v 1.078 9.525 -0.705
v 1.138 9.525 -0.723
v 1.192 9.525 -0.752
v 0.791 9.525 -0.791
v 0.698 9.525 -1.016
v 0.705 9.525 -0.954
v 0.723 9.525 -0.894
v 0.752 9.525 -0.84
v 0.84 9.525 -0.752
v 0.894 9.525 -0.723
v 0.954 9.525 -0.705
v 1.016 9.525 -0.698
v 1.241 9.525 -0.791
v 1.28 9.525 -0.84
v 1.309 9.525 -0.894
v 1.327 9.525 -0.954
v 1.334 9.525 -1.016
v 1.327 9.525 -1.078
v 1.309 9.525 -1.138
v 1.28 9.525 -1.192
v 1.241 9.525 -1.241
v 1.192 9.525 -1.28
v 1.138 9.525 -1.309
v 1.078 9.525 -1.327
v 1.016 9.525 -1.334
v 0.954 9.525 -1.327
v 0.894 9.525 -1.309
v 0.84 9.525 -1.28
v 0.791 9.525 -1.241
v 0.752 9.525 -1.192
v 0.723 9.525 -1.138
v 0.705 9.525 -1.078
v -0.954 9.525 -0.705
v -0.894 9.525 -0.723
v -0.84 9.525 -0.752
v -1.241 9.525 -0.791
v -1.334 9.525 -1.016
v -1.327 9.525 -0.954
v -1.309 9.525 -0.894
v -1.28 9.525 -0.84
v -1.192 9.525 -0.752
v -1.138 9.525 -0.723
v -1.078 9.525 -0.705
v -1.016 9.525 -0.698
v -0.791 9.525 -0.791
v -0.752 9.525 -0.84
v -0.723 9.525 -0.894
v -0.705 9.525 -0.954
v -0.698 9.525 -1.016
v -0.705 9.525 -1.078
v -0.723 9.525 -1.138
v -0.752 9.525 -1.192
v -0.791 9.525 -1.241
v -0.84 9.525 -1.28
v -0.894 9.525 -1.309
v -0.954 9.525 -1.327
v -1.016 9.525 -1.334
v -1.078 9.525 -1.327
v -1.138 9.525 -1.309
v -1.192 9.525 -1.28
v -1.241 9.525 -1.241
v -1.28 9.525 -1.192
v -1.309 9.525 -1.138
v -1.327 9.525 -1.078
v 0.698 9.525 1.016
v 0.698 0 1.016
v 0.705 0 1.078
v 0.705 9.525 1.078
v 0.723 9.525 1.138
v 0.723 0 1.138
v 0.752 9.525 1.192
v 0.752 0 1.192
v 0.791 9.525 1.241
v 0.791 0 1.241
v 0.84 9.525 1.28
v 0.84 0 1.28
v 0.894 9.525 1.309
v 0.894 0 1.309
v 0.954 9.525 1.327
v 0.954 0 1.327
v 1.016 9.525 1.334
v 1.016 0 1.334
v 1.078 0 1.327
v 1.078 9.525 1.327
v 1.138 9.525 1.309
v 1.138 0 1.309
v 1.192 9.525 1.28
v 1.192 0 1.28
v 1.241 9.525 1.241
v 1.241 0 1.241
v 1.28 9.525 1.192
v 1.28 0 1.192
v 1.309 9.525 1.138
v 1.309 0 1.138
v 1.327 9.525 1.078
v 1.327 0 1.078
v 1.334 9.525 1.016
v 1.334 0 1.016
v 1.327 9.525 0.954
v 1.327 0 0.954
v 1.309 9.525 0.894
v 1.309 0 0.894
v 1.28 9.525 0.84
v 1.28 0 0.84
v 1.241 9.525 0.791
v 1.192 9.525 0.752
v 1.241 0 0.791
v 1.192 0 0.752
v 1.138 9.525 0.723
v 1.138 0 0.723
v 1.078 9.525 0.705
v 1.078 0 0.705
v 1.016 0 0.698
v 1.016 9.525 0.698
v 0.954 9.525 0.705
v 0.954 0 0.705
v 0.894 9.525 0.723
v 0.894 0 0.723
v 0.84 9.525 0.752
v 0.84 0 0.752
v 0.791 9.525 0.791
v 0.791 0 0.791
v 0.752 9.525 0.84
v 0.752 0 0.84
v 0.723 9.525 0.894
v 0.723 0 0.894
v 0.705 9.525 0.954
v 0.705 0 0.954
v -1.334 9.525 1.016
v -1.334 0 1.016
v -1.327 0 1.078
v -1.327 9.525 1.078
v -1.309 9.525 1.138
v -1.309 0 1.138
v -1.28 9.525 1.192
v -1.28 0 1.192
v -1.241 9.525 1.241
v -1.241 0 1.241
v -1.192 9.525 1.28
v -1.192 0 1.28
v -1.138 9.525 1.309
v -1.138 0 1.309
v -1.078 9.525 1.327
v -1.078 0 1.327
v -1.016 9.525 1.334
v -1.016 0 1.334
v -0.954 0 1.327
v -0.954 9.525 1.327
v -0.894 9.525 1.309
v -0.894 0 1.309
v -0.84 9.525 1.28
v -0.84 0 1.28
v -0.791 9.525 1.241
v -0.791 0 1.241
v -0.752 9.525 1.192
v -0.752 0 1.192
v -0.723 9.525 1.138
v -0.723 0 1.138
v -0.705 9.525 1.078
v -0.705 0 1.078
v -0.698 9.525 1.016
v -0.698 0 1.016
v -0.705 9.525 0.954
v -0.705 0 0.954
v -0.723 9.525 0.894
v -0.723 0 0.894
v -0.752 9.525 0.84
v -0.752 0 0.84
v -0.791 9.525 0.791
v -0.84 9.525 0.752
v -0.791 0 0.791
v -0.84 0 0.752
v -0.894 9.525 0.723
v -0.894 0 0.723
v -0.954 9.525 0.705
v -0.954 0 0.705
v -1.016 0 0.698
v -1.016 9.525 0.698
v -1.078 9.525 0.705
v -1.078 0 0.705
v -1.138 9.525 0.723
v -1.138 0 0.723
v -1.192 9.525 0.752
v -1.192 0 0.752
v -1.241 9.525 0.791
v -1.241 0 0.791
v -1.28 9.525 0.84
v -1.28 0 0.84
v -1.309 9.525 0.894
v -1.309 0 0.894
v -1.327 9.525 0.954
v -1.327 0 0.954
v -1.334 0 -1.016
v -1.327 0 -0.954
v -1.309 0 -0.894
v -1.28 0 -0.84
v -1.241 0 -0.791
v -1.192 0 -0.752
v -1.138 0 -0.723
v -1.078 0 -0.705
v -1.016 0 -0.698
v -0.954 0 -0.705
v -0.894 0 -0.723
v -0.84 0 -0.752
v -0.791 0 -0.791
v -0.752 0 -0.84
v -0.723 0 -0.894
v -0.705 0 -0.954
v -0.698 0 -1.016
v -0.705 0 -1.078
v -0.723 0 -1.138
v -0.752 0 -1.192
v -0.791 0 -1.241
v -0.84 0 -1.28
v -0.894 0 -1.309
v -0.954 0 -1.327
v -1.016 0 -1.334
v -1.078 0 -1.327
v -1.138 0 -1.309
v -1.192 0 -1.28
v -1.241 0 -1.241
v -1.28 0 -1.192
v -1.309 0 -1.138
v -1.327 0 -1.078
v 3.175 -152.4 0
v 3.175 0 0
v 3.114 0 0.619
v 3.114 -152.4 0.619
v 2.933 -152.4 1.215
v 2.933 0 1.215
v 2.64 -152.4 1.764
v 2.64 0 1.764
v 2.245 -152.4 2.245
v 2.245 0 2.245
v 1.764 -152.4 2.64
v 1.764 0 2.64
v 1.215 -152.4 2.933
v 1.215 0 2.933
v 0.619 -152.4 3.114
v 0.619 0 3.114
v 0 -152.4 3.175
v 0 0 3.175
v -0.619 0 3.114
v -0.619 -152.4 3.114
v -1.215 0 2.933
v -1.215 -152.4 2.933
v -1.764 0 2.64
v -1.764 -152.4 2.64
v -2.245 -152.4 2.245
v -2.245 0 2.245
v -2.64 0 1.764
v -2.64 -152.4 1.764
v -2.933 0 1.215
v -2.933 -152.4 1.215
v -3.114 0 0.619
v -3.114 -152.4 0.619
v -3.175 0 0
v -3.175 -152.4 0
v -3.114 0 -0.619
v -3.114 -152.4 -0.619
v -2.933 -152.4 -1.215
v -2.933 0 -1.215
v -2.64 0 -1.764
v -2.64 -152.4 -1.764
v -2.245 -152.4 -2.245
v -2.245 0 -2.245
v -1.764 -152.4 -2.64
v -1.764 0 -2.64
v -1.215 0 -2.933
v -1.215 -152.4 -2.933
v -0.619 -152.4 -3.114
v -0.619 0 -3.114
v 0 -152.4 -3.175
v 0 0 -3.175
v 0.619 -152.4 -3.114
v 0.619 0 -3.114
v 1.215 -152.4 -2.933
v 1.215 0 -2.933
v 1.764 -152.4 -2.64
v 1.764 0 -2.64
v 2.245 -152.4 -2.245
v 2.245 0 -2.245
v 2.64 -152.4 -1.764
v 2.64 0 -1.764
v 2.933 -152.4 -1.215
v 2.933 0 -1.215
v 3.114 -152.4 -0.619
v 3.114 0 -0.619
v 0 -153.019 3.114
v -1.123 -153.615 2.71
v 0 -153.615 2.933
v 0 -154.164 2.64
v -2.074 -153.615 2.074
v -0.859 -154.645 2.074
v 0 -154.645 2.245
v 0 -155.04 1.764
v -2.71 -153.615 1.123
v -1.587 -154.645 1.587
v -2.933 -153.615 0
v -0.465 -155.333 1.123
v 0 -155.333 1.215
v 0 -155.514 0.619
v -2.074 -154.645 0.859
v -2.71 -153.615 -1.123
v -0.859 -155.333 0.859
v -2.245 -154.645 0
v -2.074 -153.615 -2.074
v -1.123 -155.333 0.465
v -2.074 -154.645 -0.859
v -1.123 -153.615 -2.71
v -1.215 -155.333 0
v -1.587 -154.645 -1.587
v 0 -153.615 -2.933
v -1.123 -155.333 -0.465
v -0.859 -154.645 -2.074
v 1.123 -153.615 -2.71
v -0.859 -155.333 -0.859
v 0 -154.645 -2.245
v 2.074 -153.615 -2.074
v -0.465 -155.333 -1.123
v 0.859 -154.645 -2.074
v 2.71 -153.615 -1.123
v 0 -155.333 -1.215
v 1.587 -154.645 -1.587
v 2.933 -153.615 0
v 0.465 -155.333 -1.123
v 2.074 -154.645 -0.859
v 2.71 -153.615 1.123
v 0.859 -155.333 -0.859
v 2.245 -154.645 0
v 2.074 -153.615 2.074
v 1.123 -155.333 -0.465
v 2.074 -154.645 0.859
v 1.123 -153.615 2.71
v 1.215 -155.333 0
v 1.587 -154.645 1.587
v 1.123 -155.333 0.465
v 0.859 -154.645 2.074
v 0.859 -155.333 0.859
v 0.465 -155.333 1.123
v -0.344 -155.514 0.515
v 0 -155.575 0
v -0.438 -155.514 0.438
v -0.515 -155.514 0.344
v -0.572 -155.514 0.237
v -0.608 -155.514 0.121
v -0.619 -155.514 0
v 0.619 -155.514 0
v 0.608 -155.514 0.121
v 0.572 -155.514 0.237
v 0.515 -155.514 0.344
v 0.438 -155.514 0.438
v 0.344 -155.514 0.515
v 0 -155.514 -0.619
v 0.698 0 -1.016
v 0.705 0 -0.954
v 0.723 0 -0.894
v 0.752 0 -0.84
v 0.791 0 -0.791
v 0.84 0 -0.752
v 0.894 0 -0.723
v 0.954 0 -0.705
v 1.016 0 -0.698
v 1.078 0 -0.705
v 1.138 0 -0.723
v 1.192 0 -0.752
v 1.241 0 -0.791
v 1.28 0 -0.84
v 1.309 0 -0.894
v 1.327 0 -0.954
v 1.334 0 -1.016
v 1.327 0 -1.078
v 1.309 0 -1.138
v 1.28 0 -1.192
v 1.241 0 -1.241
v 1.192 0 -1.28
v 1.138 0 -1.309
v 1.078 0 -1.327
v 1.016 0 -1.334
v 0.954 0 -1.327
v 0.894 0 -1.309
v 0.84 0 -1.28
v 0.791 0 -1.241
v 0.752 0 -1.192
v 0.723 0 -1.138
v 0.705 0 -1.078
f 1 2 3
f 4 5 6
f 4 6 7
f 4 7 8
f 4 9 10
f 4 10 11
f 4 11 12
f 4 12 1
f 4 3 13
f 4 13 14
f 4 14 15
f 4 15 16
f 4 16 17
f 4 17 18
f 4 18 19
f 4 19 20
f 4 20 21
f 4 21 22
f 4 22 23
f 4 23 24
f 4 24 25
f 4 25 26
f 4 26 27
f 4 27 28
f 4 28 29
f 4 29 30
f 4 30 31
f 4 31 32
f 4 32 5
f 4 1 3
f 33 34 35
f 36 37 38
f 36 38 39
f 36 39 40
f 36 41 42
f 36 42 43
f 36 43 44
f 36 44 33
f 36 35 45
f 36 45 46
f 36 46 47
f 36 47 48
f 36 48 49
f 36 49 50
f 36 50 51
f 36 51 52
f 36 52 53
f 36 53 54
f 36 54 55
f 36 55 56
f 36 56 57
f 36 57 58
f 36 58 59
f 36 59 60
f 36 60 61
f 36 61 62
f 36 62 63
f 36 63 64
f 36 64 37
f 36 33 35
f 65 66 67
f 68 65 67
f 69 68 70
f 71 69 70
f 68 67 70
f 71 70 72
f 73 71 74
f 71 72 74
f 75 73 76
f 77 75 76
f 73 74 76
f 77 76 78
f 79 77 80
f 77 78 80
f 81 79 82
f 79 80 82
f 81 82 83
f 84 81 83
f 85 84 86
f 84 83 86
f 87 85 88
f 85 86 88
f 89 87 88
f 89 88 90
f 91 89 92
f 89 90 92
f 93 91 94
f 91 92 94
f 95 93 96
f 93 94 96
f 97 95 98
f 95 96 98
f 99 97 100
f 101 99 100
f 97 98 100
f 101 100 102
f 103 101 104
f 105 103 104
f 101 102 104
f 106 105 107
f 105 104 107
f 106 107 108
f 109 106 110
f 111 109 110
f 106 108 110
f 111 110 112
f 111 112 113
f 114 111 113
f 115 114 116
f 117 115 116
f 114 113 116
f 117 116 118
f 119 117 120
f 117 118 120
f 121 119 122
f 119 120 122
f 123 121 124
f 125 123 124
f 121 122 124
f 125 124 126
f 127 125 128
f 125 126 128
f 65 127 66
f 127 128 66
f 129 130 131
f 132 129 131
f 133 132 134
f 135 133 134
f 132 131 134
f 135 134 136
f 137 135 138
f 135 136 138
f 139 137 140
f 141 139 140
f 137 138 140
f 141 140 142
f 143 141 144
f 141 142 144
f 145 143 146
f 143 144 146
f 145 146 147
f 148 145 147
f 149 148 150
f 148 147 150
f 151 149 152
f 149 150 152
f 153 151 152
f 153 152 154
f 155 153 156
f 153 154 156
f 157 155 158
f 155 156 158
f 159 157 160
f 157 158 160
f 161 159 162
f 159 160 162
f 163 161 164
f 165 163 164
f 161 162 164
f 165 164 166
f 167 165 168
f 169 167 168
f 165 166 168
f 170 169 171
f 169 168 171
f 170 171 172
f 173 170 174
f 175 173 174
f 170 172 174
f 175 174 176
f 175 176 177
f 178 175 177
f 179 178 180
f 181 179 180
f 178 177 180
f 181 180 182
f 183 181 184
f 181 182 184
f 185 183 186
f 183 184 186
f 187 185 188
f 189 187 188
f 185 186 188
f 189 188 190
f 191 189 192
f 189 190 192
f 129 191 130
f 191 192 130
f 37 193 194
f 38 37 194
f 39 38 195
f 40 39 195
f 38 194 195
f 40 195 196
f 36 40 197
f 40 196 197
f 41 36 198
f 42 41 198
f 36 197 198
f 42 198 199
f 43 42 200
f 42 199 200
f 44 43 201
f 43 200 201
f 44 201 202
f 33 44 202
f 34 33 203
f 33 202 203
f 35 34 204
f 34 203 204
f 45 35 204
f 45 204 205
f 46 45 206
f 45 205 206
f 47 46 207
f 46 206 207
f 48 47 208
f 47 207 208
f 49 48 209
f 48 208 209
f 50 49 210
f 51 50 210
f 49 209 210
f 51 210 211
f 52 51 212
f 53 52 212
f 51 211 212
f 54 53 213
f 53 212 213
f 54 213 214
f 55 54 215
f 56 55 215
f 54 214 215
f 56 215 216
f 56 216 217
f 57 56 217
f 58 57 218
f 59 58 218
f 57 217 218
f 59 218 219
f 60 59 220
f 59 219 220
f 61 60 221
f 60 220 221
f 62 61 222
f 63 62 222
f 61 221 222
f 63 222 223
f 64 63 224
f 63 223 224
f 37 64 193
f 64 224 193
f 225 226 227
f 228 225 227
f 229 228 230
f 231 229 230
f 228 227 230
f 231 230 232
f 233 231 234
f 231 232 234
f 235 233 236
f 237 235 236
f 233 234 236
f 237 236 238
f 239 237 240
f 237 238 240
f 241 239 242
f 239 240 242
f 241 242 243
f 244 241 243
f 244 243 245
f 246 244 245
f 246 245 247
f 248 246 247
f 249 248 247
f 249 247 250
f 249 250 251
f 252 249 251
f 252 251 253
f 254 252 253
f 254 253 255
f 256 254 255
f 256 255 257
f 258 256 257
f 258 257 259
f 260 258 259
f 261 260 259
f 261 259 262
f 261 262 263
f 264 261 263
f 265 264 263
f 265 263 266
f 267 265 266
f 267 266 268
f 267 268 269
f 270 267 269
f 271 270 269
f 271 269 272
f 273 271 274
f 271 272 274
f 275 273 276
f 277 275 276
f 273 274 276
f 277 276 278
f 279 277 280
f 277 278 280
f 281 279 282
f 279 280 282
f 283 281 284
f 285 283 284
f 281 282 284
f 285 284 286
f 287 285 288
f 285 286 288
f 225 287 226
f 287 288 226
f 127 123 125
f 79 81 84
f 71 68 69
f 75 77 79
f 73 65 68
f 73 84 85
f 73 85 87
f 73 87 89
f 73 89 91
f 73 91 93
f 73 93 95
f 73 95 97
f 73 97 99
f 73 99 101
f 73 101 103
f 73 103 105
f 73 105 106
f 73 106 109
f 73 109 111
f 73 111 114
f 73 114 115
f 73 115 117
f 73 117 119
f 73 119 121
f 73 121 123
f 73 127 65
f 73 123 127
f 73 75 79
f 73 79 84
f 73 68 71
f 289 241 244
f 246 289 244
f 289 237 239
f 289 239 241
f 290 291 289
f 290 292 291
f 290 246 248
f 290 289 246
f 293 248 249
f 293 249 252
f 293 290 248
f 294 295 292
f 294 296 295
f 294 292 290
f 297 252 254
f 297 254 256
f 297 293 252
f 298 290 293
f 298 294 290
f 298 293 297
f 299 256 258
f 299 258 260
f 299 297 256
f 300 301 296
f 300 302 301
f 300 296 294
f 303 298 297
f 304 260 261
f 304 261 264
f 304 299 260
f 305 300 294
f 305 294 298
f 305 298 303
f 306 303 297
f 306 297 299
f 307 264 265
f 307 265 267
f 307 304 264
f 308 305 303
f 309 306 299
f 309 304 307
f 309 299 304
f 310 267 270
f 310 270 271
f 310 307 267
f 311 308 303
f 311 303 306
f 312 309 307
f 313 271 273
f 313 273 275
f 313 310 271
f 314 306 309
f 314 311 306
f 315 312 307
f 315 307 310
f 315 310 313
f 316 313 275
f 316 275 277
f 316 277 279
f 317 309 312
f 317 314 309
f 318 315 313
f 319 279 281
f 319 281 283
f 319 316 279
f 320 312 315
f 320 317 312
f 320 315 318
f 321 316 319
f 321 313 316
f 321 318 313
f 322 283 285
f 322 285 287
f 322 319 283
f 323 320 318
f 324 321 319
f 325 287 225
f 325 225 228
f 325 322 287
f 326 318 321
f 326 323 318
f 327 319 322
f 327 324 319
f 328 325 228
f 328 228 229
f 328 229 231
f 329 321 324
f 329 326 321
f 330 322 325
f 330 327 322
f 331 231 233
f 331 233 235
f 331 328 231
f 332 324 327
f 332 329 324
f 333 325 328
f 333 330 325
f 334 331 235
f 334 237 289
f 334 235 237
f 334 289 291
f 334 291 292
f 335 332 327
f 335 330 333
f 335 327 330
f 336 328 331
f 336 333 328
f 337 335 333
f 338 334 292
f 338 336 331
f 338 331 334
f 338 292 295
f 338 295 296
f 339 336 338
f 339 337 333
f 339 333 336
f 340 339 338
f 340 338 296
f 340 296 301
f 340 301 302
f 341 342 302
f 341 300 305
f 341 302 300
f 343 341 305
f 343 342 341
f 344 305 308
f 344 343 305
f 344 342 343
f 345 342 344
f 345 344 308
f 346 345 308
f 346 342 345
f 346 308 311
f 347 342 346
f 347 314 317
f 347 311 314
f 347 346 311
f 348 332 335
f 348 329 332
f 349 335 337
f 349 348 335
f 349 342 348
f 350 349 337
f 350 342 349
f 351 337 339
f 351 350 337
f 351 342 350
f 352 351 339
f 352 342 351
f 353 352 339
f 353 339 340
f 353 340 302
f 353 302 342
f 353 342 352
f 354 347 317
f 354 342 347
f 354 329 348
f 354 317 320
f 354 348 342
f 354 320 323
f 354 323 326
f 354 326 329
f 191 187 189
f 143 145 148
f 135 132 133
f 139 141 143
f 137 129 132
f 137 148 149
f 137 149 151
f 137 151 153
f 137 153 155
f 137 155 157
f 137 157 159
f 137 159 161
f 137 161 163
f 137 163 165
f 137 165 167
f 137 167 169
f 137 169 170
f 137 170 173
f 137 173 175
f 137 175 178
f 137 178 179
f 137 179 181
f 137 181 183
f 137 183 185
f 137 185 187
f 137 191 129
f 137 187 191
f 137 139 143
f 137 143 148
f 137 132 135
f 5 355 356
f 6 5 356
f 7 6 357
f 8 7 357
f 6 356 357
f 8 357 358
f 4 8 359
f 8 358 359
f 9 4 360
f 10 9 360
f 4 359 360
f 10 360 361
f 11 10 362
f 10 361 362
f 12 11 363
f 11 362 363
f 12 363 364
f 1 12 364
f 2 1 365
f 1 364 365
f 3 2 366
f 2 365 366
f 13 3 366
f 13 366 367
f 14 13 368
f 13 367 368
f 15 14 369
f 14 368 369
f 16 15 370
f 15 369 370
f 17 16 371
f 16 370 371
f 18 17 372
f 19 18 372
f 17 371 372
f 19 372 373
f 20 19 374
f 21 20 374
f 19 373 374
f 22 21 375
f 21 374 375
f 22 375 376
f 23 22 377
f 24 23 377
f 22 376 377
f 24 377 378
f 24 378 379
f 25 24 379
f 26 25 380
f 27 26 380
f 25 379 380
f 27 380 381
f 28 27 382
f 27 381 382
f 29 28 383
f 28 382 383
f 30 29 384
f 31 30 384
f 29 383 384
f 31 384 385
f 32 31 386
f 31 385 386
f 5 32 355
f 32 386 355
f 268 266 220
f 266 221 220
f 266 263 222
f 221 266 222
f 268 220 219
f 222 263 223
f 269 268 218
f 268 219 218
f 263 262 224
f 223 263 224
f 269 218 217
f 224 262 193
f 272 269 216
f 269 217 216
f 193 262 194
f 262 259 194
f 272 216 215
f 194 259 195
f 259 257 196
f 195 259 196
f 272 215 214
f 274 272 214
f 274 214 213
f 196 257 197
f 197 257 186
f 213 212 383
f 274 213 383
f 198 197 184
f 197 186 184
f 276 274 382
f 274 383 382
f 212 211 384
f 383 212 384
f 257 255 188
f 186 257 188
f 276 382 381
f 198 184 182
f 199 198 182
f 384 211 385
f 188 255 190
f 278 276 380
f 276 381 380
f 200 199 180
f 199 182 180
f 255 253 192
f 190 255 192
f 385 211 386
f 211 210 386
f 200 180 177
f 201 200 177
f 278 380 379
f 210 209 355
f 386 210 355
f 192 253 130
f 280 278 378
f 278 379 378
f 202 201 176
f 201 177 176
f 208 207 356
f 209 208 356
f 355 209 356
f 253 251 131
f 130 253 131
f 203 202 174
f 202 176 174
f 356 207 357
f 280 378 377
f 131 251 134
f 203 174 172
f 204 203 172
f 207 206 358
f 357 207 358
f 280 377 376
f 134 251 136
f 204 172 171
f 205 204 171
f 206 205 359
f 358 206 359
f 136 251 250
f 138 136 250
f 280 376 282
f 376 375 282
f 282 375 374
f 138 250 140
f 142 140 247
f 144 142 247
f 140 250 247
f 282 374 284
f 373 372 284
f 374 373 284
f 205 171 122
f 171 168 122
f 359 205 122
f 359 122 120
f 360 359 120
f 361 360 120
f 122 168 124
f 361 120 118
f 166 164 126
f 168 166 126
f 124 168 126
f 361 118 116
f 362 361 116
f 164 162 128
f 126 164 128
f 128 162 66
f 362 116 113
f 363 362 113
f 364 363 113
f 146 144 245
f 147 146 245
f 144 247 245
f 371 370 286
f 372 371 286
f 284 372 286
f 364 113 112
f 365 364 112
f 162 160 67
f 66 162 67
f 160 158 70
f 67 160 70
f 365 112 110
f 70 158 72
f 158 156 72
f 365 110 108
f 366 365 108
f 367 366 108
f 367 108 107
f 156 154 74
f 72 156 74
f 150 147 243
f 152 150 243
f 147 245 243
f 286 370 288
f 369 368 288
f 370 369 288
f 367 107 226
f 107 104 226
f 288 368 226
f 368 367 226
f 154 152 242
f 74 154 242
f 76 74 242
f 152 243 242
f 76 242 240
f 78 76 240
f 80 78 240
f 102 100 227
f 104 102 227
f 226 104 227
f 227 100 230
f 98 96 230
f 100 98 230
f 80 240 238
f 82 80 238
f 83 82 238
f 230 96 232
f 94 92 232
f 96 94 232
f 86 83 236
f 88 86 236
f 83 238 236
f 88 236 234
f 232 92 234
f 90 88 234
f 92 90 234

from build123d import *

# Parameters (mm, degrees)
F0_R     = 3.175
F1_DEPTH = 152.4
F4_R     = 0.3175
F5_DEPTH = 9.525


with BuildPart() as f1:
    # F0 (on Front) → F1 (new body)
    with BuildSketch(Plane.XZ):
        Circle(F0_R)
    extrude(amount=F1_DEPTH)

    # F2 (on Right) → F3 (revolve)
    with BuildSketch(Plane.YZ):
        with BuildLine():
            Line((-152.4, 0), (-152.4, 3.175))
            ThreePointArc((-152.4, 3.175), (-154.645064, 2.245064), (-155.575, 0))
            Line((-155.575, 0), (-152.4, 0))
        make_face()
    revolve(axis=Axis((0, -168.975449, 0), (0, -1, 0)))

    # F4 (on face) → F5 (join)
    with BuildSketch(Plane(origin=(0, 0, 0), x_dir=(-1, 0, 0), z_dir=(0, 1, 0))):
        with Locations((1.016, -1.016)):
            Circle(F4_R)
        with Locations((-1.016, -1.016)):
            Circle(F4_R)
        with Locations((1.016, 1.016)):
            Circle(F4_R)
        with Locations((-1.016, 1.016)):
            Circle(F4_R)
    extrude(amount=F5_DEPTH)


solid = f1.part
